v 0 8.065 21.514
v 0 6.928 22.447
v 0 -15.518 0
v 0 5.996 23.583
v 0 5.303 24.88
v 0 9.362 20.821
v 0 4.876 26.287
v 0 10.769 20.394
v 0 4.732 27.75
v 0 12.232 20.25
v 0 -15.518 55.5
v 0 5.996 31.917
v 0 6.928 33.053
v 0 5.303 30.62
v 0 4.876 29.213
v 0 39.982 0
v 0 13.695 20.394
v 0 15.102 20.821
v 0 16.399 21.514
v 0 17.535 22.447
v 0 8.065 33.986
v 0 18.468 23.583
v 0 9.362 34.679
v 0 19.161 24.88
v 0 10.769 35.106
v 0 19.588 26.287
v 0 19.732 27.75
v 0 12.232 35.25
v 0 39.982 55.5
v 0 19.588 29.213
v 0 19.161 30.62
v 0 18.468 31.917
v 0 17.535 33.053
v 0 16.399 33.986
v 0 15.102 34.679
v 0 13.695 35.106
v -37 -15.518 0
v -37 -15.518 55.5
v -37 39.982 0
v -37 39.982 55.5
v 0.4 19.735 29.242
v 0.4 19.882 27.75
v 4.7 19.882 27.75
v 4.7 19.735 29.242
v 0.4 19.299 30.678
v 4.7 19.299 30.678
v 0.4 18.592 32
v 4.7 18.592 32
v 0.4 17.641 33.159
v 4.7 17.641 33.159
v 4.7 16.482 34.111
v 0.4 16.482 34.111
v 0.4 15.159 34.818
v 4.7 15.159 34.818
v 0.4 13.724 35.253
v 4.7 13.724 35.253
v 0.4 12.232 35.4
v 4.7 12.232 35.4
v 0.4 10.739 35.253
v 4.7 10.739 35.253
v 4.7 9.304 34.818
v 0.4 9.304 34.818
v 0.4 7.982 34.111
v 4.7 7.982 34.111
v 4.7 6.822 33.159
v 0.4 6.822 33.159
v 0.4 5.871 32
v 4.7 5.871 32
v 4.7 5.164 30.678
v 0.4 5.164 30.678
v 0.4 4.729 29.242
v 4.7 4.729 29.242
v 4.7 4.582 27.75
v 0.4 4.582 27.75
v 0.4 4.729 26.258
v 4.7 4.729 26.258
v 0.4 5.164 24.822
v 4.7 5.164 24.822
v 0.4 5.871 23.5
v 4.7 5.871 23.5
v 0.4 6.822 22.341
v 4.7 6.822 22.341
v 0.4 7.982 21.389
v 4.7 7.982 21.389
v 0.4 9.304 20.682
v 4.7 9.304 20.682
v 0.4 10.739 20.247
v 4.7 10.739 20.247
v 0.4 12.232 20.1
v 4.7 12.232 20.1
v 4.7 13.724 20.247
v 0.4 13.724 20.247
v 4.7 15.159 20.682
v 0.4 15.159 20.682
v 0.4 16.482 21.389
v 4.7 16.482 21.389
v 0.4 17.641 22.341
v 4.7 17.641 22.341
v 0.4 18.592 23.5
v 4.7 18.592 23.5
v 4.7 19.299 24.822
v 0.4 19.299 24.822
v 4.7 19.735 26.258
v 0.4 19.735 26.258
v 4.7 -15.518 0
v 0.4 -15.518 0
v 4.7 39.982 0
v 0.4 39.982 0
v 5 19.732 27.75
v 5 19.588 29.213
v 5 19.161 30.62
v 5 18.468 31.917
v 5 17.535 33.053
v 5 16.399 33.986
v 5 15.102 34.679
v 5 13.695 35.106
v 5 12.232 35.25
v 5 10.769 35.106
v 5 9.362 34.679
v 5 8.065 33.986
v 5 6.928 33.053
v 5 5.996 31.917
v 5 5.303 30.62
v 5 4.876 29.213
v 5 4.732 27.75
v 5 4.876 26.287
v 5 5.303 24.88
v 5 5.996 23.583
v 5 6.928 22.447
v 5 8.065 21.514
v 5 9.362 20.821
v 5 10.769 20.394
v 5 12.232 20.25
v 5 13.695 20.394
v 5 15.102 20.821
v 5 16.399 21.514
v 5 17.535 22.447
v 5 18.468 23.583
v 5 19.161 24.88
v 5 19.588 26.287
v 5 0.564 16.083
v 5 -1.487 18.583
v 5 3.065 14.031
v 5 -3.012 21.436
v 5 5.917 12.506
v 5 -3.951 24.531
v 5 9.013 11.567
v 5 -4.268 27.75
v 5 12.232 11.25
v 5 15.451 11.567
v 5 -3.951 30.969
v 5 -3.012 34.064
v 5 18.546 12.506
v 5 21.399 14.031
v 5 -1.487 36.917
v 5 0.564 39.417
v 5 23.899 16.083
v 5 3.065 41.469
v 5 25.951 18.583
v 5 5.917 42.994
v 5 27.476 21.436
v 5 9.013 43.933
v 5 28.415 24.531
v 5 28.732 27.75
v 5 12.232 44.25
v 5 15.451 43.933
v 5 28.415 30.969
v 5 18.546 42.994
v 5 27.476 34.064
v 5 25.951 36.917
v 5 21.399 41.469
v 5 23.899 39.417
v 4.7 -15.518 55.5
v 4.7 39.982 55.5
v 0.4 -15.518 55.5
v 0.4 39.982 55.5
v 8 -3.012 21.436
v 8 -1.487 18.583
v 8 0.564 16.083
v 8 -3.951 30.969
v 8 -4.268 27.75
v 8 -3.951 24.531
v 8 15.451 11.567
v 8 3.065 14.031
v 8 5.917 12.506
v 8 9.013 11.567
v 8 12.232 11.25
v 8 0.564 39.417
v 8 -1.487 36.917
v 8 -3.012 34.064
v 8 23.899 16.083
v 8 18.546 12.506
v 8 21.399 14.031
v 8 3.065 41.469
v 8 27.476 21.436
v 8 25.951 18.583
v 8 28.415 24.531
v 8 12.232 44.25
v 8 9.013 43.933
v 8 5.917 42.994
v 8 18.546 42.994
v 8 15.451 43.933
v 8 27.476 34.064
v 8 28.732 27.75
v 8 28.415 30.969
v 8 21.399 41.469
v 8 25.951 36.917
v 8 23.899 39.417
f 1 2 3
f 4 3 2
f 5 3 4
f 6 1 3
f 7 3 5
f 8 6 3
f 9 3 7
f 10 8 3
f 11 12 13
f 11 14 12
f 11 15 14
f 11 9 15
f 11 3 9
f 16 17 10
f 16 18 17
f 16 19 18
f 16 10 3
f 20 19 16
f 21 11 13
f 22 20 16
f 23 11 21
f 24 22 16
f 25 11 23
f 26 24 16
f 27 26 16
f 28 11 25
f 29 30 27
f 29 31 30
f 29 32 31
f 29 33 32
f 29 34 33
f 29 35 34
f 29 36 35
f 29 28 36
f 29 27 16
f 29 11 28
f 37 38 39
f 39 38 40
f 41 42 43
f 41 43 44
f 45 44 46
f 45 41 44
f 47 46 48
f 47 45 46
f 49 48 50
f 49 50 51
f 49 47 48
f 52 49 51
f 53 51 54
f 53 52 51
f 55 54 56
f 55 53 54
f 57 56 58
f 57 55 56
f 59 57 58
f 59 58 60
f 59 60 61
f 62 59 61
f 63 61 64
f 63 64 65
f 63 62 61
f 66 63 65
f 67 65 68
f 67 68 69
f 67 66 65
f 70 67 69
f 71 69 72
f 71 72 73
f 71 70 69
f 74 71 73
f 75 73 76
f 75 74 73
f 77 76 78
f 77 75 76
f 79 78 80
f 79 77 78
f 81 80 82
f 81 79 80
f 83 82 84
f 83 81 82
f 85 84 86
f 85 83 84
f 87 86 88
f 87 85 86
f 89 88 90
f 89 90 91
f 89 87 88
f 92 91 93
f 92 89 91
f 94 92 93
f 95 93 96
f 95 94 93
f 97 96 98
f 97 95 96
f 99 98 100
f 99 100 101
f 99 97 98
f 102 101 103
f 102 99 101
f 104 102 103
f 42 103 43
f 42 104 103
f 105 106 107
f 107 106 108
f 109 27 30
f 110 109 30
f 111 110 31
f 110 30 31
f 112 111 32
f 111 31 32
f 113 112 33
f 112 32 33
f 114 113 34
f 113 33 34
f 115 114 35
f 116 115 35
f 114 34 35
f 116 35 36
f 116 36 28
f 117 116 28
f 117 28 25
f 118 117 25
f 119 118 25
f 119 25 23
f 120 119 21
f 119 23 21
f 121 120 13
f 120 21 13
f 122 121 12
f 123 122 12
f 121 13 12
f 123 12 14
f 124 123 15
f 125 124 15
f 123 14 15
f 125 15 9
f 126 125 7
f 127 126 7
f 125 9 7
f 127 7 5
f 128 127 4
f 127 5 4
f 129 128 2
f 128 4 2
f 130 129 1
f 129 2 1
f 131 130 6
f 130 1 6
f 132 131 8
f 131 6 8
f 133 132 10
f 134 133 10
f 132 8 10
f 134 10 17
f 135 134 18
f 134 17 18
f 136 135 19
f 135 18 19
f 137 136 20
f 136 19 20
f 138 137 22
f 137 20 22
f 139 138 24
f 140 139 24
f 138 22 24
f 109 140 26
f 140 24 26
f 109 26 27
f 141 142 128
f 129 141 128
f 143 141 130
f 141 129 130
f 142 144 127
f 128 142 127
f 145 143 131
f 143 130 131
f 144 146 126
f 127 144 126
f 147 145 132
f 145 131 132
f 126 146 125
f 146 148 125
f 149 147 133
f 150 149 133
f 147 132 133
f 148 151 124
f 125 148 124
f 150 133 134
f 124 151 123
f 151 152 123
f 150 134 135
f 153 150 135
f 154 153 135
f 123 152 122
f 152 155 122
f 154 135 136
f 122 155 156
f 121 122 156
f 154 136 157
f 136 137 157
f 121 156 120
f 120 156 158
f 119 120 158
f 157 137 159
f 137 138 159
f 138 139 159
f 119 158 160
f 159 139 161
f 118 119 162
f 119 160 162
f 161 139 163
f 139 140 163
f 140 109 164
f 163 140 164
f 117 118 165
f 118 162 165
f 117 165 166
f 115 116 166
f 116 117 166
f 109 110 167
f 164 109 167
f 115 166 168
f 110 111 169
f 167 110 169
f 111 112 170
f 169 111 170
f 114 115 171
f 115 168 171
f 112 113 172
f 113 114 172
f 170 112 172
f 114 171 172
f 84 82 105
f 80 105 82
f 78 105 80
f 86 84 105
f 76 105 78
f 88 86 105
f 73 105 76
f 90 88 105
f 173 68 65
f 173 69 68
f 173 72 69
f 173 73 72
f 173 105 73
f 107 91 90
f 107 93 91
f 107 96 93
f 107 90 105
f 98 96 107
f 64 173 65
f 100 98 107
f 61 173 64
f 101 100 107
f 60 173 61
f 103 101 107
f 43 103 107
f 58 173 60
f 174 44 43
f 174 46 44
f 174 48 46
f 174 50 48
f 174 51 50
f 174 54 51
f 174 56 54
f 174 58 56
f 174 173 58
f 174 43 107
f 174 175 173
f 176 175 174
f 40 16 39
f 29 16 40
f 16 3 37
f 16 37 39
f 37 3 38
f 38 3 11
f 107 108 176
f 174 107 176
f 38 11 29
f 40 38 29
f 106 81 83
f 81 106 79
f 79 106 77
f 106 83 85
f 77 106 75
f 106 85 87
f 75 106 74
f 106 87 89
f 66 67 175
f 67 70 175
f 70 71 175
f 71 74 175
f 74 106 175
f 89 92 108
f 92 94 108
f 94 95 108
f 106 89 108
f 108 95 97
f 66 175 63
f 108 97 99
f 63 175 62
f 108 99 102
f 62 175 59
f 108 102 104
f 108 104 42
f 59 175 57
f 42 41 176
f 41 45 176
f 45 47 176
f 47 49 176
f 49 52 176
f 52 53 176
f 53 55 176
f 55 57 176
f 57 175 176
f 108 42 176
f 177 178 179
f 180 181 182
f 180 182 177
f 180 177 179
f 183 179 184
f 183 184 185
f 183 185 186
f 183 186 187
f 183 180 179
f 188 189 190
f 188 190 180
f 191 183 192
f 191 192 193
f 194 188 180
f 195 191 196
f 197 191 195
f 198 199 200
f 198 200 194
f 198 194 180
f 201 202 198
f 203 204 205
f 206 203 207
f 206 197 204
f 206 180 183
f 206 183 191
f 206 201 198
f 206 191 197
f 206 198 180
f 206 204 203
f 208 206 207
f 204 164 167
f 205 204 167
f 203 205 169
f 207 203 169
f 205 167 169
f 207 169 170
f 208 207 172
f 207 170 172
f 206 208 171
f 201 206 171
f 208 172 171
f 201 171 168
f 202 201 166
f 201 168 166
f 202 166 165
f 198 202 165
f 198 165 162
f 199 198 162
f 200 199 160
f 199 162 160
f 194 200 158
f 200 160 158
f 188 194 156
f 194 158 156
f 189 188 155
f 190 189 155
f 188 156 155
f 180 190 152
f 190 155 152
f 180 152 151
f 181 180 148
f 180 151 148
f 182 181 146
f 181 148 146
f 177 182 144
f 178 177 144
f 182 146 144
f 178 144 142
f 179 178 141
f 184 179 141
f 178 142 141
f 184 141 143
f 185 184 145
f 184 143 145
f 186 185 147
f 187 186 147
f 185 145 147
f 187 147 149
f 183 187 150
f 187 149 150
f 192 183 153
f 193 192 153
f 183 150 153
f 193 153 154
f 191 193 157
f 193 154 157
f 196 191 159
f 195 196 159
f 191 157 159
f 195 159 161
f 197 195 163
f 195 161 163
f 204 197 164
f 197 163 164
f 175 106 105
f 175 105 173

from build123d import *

# Parameters (mm, degrees)
F0_W     = 55.5
F0_H     = 55.5
F0_R     = 7.5
F1_DEPTH = 37
F2_DEPTH = 5
F3_R     = 16.5
F3_R_2   = 7.5
F4_DEPTH = 3
F6_W     = 55.5
F6_H     = 55.5
F6_R     = 7.65
F7_DEPTH = 4.3


with BuildPart() as f1:
    # F0 (on Right) → F1 (new body)
    with BuildSketch(Plane.YZ):
        with Locations((12.2317537814, 27.75)):
            Rectangle(F0_W, F0_H)
        with Locations((12.2317537814, 27.75)):
            Circle(F0_R, mode=Mode.SUBTRACT)
        with Locations((12.2317537814, 27.75)):
            Circle(F0_R)
    extrude(amount=-F1_DEPTH)

    # F0 (on Right) → F2 (join)
    with BuildSketch(Plane.YZ):
        with Locations((12.2317537814, 27.75)):
            Circle(F0_R)
    extrude(amount=F2_DEPTH)

    # F3 (on face) → F4 (join)
    with BuildSketch(Plane.YZ.offset(5)):
        with Locations((12.2317537814, 27.75)):
            Circle(F3_R)
        with Locations((12.2317537814, 27.75)):
            Circle(F3_R_2, mode=Mode.SUBTRACT)
        with Locations((12.2317537814, 27.75)):
            Circle(F3_R_2)
    extrude(amount=F4_DEPTH)


with BuildPart() as f7:
    # F6 (on offset) → F7 (new body)
    with BuildSketch(Plane.YZ.offset(0.4)):
        with Locations((12.2317537814, 27.75)):
            Rectangle(F6_W, F6_H)
        with Locations((12.2317537814, 27.75)):
            Circle(F6_R, mode=Mode.SUBTRACT)
    extrude(amount=F7_DEPTH)


solid = Compound([f1.part, f7.part])
